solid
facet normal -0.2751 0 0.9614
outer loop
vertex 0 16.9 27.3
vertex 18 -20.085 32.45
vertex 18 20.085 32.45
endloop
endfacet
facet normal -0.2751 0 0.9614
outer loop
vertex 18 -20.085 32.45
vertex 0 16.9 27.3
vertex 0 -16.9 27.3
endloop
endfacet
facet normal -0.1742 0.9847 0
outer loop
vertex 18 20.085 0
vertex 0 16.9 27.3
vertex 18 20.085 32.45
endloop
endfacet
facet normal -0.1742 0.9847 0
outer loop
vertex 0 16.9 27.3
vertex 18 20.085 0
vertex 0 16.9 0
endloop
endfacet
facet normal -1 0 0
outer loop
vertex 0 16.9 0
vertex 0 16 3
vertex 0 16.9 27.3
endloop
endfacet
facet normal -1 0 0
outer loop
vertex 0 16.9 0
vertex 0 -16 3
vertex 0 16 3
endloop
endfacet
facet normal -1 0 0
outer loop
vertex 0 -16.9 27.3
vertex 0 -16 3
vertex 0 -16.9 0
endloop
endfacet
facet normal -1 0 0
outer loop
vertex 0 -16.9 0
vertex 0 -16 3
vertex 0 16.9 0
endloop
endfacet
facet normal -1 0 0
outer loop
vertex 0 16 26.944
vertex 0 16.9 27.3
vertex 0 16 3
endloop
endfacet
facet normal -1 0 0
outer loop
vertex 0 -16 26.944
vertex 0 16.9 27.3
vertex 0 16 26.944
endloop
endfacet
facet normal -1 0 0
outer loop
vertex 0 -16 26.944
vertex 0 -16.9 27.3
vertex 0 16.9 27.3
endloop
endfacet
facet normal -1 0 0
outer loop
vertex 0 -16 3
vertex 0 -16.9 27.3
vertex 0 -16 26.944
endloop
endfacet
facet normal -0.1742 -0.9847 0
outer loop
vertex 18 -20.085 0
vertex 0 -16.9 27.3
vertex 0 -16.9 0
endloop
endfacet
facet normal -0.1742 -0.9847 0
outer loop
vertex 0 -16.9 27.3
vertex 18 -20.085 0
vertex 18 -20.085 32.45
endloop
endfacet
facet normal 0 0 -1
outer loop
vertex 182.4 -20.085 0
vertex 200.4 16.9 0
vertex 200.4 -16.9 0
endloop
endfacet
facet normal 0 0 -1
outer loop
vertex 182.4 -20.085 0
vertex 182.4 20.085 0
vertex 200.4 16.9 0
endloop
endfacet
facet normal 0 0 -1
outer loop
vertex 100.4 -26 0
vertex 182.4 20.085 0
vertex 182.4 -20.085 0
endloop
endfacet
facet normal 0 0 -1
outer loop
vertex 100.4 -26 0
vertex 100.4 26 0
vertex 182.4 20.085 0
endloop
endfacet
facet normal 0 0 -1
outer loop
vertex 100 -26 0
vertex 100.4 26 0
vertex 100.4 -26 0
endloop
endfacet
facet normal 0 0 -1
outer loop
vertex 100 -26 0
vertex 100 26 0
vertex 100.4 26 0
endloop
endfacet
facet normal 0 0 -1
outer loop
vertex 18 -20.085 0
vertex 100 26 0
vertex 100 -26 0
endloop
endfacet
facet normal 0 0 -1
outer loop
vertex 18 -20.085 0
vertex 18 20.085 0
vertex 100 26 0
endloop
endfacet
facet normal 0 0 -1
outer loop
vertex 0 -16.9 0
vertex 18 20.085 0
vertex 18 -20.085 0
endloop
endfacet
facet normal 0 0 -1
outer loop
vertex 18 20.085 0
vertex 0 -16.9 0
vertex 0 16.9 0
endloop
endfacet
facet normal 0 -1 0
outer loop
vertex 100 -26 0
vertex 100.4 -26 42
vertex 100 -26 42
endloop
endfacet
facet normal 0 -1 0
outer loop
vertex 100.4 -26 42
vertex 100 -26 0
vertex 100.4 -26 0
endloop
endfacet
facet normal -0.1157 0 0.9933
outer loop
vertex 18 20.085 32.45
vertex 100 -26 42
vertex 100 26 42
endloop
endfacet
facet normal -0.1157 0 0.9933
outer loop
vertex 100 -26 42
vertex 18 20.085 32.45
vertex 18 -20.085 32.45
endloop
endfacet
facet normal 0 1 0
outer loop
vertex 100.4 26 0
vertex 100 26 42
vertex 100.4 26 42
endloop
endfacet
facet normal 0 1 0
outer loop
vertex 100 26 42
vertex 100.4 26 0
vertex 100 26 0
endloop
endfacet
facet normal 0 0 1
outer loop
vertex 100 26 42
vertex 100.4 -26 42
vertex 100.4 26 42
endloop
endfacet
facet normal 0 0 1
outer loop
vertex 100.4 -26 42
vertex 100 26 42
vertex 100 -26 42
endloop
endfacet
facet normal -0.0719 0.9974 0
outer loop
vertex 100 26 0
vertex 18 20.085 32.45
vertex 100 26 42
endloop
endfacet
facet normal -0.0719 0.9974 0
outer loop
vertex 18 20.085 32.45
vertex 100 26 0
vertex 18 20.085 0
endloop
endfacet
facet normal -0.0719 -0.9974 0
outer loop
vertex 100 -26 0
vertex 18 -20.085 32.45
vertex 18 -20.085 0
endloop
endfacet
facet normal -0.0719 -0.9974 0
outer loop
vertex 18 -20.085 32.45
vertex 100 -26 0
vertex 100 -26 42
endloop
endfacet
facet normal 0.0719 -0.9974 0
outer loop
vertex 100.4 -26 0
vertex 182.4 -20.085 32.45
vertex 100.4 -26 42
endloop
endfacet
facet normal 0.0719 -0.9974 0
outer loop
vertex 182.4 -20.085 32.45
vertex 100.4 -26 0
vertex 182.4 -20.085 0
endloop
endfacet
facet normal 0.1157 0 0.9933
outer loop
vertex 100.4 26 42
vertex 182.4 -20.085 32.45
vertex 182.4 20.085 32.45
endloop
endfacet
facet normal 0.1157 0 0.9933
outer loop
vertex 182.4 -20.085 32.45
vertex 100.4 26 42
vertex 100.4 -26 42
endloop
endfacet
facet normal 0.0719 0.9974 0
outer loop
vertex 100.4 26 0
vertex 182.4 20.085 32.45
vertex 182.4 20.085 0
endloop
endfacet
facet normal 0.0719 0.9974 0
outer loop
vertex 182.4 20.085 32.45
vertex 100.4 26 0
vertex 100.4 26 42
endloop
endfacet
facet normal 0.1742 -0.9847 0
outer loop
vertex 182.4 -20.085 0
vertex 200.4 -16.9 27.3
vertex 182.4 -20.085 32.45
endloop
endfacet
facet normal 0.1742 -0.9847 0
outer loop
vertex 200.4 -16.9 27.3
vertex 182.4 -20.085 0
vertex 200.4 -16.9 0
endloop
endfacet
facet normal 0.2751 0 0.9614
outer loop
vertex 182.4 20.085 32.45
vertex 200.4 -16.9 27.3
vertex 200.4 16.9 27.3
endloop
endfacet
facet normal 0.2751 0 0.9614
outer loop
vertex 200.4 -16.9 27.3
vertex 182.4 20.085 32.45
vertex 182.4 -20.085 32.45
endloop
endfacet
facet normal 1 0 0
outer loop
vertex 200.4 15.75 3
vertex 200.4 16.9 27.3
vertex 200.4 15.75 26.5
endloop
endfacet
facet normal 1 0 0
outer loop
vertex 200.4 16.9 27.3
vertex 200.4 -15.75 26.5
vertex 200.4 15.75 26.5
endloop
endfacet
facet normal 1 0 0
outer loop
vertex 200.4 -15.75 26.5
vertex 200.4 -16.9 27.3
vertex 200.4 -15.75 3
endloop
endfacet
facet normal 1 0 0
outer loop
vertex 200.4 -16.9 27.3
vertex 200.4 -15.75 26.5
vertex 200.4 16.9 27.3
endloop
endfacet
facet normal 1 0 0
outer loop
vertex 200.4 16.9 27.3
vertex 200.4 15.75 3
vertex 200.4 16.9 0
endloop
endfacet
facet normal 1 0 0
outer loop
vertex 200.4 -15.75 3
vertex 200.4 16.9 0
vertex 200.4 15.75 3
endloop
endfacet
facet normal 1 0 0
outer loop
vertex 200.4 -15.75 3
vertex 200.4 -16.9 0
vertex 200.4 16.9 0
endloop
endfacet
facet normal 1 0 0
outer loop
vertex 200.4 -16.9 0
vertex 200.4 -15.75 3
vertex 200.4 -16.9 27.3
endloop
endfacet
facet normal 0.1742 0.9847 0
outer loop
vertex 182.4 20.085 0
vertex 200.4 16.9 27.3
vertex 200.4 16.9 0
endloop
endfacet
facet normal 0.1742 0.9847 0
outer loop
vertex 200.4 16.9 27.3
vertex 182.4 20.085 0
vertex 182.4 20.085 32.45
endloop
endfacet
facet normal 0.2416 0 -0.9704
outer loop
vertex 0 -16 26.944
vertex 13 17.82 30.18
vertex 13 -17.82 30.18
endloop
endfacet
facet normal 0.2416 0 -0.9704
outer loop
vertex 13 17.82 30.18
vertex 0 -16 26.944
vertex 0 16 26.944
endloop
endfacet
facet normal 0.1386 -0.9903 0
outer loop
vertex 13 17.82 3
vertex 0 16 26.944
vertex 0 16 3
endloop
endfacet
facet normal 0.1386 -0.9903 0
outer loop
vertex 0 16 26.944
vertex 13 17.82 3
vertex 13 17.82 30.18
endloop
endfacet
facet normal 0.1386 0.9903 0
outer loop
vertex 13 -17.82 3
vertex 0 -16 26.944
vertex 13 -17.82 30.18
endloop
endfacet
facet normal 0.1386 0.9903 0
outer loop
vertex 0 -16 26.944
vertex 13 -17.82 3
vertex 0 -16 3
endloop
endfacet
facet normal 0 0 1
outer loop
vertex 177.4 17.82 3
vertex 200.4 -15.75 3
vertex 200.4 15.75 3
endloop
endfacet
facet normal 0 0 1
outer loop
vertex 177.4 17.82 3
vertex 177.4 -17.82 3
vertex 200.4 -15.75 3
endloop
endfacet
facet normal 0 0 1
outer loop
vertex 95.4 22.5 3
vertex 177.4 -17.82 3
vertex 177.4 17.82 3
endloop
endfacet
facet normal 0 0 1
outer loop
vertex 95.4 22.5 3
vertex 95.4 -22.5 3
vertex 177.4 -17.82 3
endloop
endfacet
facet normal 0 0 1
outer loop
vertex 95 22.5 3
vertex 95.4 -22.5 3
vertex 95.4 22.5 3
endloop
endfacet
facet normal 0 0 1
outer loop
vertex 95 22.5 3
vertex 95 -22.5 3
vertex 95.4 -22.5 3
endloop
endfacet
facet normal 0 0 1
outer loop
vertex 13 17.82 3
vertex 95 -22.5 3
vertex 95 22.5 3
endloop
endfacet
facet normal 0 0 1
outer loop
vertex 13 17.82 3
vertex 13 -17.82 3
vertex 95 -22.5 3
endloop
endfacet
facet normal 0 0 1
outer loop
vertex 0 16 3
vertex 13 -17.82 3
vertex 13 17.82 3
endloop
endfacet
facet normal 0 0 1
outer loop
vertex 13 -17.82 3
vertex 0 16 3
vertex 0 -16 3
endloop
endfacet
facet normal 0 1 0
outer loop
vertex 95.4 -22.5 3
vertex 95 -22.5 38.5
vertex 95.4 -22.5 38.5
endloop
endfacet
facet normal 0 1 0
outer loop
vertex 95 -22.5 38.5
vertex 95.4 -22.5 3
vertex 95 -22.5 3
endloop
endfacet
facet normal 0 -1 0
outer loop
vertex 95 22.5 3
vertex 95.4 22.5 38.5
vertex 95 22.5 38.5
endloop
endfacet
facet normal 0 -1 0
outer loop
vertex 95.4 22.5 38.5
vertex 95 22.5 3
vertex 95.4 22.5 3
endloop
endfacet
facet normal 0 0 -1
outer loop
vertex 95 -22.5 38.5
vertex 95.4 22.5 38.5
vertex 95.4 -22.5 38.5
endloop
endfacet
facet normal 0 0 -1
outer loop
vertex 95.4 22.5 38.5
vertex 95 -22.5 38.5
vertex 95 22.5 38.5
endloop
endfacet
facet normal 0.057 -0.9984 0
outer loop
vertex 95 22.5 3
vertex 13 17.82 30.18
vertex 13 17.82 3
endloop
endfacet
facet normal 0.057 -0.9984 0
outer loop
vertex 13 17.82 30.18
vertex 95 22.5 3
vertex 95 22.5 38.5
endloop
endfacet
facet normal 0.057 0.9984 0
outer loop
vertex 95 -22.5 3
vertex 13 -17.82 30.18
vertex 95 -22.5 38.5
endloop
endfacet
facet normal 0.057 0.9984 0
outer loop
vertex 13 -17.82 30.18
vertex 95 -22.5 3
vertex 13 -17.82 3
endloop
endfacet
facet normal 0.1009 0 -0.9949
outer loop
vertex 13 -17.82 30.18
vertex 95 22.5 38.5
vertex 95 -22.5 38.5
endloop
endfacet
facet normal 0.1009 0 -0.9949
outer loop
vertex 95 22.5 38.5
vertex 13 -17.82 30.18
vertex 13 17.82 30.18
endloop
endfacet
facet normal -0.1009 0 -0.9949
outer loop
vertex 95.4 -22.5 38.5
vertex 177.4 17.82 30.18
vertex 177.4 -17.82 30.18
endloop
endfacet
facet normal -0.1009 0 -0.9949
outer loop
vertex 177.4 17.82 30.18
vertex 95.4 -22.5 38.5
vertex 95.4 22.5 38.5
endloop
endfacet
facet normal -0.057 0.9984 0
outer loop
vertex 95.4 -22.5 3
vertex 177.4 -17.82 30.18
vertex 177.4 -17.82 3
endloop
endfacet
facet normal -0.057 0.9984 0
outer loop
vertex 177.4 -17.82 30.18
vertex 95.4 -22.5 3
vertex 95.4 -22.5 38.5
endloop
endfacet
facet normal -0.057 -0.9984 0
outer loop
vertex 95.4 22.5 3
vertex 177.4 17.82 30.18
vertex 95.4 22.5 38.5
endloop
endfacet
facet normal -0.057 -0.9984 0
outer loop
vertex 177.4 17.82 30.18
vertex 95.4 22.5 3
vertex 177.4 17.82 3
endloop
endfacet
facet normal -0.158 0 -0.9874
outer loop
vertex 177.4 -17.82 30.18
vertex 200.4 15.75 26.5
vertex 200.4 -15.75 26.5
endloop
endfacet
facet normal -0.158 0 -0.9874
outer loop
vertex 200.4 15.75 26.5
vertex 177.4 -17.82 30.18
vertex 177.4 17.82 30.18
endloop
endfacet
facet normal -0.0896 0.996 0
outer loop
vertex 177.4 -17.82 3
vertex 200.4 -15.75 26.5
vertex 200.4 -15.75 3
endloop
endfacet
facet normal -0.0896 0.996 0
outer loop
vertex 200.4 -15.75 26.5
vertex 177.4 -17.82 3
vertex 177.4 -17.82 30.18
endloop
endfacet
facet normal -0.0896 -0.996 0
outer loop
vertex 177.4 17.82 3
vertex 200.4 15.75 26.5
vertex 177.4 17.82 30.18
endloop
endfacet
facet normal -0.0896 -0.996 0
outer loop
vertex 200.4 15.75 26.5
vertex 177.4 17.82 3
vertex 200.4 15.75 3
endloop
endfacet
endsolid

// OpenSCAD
$fn = 32;

// ----------------------------------------------------------------------
// Faired channel: 200 x 52 x 42 mm, 3.5 mm walls, faired ends
// ----------------------------------------------------------------------

// --- parameters (mm) ---
length = 200;             // channel length
width = 52;               // channel width at mid length
height = 42;              // channel height at mid length
wall = 3.5;               // side wall thickness
floor_t = 3;              // floor thickness
end_w = 33.8;             // faired end width
end_h = 27.3;             // faired end height

difference() {
  union() {
    hull() {
      translate([0, -16.9, 0]) cube([0.4, 33.8, 27.3]);
      translate([18, -20.085, 0]) cube([0.4, 40.17, 32.45]);
    }
    hull() {
      translate([18, -20.085, 0]) cube([0.4, 40.17, 32.45]);
      translate([100, -26, 0]) cube([0.4, 52, 42]);
    }
    hull() {
      translate([100, -26, 0]) cube([0.4, 52, 42]);
      translate([182, -20.085, 0]) cube([0.4, 40.17, 32.45]);
    }
    hull() {
      translate([182, -20.085, 0]) cube([0.4, 40.17, 32.45]);
      translate([200, -16.9, 0]) cube([0.4, 33.8, 27.3]);
    }
  }
  /* cavity, 5 mm proud of both ends so the ports are cut clean */
  hull() {
    translate([-5, -15.3, 3]) cube([0.4, 30.6, 22.7]);
    translate([13, -17.82, 3]) cube([0.4, 35.64, 27.18]);
  }
  hull() {
    translate([13, -17.82, 3]) cube([0.4, 35.64, 27.18]);
    translate([95, -22.5, 3]) cube([0.4, 45, 35.5]);
  }
  hull() {
    translate([95, -22.5, 3]) cube([0.4, 45, 35.5]);
    translate([177, -17.82, 3]) cube([0.4, 35.64, 27.18]);
  }
  hull() {
    translate([177, -17.82, 3]) cube([0.4, 35.64, 27.18]);
    translate([205, -15.3, 3]) cube([0.4, 30.6, 22.7]);
  }
}
